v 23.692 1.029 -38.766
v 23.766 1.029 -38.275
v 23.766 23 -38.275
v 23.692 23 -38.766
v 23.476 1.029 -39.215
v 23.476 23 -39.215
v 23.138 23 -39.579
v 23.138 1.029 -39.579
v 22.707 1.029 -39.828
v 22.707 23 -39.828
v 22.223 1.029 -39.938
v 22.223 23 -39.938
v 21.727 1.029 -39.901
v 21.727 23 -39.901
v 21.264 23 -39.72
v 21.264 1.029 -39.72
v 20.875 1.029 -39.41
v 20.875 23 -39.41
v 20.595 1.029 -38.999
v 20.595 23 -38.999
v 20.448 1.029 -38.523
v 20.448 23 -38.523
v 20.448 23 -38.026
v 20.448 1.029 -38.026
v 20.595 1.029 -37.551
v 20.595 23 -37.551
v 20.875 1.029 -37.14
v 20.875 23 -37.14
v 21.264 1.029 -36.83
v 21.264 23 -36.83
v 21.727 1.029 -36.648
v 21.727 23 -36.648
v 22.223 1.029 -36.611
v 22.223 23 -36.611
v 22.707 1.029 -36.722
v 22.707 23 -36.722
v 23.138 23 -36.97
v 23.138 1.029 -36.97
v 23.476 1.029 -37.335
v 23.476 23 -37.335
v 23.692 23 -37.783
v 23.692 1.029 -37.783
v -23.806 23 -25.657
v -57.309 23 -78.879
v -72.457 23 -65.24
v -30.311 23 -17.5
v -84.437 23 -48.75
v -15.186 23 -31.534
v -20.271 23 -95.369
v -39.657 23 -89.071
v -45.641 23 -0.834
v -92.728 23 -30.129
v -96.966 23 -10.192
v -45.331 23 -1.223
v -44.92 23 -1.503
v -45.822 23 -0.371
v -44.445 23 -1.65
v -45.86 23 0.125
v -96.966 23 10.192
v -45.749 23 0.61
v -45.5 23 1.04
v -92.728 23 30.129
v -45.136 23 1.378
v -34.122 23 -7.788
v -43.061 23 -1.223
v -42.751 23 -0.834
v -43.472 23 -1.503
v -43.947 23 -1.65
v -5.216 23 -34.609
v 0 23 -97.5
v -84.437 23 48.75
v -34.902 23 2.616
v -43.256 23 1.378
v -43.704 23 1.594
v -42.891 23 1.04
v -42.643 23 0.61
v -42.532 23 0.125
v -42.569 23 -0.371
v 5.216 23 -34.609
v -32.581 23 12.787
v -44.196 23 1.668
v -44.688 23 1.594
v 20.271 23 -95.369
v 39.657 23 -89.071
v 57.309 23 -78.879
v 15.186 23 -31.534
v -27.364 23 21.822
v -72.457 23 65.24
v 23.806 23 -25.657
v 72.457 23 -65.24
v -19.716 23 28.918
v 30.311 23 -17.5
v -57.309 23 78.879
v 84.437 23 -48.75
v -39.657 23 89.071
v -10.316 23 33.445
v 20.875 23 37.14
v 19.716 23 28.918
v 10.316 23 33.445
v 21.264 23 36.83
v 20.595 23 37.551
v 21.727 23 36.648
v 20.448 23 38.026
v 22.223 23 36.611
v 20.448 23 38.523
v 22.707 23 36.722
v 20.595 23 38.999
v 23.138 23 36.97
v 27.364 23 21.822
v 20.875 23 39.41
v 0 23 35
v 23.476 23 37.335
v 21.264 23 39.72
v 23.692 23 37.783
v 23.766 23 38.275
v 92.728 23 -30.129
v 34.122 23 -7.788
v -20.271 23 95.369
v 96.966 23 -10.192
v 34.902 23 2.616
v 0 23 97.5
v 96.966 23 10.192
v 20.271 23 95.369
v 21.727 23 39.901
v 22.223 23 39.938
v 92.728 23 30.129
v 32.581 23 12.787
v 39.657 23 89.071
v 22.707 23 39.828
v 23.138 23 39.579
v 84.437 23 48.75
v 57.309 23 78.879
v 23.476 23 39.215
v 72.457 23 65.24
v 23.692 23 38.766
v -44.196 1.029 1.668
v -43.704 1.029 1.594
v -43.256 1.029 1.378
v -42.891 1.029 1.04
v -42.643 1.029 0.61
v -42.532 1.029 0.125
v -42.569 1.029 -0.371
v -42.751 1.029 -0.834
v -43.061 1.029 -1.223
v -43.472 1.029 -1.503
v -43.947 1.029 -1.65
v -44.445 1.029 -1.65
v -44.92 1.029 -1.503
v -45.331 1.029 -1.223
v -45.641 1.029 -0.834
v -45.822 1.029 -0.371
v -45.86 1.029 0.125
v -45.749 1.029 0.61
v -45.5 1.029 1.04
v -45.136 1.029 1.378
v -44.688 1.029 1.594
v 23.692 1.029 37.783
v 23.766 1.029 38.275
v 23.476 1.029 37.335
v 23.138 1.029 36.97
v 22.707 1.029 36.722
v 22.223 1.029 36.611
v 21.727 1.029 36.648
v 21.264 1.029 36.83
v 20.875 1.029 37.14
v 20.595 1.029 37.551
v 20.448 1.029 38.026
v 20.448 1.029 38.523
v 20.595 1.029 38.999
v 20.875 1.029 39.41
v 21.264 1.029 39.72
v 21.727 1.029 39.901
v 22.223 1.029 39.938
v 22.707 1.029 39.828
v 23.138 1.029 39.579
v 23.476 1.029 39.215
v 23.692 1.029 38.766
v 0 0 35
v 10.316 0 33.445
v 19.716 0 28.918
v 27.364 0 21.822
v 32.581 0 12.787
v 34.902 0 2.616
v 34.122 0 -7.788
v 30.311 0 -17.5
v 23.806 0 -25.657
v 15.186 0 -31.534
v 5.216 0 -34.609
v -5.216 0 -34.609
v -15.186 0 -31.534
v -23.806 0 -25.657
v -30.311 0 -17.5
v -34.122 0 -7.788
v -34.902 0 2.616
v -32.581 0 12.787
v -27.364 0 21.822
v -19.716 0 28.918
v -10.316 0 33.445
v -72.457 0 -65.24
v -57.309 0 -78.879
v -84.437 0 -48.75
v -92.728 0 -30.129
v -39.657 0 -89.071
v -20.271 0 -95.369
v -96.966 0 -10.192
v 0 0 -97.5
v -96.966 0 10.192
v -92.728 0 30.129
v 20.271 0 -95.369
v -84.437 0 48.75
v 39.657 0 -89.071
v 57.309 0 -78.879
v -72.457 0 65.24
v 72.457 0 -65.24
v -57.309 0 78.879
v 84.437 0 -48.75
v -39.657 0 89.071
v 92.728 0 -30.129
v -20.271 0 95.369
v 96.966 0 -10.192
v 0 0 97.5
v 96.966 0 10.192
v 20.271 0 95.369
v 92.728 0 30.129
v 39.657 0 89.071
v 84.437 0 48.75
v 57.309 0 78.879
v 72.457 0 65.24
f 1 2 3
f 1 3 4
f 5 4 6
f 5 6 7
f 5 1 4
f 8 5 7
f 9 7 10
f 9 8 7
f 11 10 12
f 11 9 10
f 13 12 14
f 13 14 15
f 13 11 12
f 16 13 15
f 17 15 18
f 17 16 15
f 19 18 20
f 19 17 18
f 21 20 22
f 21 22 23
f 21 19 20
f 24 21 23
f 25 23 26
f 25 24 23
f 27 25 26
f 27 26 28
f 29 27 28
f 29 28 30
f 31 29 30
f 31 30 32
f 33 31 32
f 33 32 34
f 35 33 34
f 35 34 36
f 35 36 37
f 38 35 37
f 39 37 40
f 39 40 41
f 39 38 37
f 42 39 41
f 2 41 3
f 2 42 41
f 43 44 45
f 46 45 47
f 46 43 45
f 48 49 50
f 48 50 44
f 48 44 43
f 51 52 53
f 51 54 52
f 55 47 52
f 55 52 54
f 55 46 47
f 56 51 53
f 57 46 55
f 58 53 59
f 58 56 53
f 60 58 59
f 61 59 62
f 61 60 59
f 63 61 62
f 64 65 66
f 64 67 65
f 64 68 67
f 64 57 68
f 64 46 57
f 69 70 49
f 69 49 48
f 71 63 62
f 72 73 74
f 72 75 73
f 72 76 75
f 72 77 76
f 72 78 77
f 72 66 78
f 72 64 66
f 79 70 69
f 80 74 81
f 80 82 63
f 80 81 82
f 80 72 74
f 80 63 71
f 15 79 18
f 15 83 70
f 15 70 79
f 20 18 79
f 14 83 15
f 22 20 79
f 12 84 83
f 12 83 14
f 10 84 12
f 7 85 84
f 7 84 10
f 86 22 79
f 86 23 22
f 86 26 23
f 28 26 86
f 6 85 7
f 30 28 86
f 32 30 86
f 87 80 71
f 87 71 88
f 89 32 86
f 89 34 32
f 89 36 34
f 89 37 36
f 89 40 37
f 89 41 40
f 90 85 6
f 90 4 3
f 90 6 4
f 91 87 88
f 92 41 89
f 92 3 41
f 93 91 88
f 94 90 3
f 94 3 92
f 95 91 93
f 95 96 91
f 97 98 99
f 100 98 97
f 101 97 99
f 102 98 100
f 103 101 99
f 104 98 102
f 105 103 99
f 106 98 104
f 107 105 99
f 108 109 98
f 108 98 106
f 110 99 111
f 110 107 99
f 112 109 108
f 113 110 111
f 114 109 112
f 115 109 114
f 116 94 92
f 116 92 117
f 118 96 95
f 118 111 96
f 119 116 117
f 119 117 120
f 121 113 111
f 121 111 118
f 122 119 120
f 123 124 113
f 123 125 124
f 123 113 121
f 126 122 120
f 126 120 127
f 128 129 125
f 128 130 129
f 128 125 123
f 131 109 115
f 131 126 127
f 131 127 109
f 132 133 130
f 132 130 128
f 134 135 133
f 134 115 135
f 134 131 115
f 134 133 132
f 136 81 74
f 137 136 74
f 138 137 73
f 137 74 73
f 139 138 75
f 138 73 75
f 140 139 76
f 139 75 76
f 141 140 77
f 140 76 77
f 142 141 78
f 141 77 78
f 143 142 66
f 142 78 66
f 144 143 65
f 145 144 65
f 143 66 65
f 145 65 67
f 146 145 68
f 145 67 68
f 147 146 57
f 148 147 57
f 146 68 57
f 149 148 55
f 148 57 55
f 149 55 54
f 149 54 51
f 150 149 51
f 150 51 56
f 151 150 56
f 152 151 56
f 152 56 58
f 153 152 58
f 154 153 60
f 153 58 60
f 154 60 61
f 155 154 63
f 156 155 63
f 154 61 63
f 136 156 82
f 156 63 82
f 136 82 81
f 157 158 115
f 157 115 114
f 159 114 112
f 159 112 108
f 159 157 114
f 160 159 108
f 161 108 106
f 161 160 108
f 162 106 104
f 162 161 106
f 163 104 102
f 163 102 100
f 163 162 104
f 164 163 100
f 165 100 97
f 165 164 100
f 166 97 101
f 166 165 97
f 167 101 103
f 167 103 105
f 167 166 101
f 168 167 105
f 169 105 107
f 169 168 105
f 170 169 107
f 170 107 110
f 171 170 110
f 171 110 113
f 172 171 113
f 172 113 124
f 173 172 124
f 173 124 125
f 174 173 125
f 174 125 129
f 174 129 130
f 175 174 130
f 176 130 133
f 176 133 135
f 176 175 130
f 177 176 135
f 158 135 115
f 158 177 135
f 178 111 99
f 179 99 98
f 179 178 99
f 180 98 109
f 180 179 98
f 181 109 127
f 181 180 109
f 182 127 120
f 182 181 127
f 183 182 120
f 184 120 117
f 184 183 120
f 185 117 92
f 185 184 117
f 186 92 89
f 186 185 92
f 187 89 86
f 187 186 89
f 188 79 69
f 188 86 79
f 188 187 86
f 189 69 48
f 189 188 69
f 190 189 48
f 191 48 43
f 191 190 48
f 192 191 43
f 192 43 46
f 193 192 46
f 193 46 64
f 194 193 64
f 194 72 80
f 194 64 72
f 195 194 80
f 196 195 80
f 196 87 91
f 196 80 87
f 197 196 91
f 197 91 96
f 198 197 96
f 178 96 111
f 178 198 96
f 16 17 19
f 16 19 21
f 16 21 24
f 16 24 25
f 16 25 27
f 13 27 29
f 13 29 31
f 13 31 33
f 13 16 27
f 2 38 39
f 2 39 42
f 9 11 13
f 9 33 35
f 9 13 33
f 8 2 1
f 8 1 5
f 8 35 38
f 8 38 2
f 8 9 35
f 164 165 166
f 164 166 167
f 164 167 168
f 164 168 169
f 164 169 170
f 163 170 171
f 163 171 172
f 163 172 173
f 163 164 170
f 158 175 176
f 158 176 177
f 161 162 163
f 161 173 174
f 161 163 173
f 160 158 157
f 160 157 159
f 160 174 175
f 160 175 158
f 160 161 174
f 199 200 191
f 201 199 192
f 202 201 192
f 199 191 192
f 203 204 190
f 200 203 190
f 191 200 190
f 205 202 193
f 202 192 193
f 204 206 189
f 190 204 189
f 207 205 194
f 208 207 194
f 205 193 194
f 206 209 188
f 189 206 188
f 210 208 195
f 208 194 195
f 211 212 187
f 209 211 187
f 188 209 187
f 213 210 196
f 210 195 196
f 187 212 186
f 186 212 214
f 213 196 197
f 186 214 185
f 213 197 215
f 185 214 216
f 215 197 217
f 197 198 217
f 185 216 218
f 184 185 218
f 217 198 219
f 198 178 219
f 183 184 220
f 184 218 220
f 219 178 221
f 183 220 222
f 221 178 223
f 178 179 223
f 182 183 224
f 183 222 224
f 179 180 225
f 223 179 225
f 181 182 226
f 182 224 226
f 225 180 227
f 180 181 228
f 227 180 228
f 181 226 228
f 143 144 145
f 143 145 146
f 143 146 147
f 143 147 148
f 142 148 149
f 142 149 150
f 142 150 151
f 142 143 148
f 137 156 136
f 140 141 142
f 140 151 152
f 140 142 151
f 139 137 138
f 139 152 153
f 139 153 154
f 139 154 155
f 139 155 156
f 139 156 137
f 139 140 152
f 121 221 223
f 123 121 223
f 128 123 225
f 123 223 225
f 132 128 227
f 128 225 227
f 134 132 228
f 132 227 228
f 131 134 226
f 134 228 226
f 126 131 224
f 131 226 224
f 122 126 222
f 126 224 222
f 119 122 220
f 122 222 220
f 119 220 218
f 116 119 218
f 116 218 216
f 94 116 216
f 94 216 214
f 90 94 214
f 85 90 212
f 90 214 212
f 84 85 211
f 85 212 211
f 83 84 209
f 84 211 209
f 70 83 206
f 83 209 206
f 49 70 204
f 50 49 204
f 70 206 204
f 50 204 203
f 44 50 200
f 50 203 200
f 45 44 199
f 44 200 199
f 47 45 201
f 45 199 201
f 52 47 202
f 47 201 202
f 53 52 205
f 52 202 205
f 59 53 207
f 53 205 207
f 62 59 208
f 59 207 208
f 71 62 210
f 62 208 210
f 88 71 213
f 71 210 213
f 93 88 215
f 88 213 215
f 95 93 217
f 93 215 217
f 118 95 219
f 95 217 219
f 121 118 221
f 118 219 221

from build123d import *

# Parameters (mm, degrees)
SKETCH1_R           = 97.5
BOSS_EXTRUDE1_DEPTH = 23
SKETCH2_R           = 35
CUT_EXTRUDE1_DEPTH  = 140.790915299
SKETCH3_R           = 1.668376245
CUT_EXTRUDE2_DEPTH  = 21.971332098
CIRPATTERN1_COUNT   = 3


with BuildPart() as part:
    # Sketch1 → Boss-Extrude1 (new body)
    with BuildSketch(Plane(origin=(0, 0, 0), x_dir=(1, 0, 0), z_dir=(0, 1, 0))):
        Circle(SKETCH1_R)
    extrude(amount=BOSS_EXTRUDE1_DEPTH)

    # Sketch2 → Cut-Extrude1 (cut, through all)
    with BuildSketch(Plane(origin=(0, 0, 0), x_dir=(1, 0, 0), z_dir=(0, 1, 0))):
        Circle(SKETCH2_R)
    extrude(amount=CUT_EXTRUDE1_DEPTH, mode=Mode.SUBTRACT)

    # Sketch3 → Cut-Extrude2 (cut)
    with BuildSketch(Plane(origin=(0, 23, 0), x_dir=(1, 0, 0), z_dir=(0, 1, 0))):
        with Locations((-44.195851492, 0)):
            Circle(SKETCH3_R)
    cut_extrude2 = extrude(amount=-CUT_EXTRUDE2_DEPTH, mode=Mode.SUBTRACT)

    # CirPattern1: Cut-Extrude2 ×3 about axis
    cirpattern1_axis = Axis((0, 0, 0), (0, 1, 0))
    for i in range(1, CIRPATTERN1_COUNT):
        add(cut_extrude2.rotate(cirpattern1_axis, i * 360 / CIRPATTERN1_COUNT), mode=Mode.SUBTRACT)


solid = part.part
